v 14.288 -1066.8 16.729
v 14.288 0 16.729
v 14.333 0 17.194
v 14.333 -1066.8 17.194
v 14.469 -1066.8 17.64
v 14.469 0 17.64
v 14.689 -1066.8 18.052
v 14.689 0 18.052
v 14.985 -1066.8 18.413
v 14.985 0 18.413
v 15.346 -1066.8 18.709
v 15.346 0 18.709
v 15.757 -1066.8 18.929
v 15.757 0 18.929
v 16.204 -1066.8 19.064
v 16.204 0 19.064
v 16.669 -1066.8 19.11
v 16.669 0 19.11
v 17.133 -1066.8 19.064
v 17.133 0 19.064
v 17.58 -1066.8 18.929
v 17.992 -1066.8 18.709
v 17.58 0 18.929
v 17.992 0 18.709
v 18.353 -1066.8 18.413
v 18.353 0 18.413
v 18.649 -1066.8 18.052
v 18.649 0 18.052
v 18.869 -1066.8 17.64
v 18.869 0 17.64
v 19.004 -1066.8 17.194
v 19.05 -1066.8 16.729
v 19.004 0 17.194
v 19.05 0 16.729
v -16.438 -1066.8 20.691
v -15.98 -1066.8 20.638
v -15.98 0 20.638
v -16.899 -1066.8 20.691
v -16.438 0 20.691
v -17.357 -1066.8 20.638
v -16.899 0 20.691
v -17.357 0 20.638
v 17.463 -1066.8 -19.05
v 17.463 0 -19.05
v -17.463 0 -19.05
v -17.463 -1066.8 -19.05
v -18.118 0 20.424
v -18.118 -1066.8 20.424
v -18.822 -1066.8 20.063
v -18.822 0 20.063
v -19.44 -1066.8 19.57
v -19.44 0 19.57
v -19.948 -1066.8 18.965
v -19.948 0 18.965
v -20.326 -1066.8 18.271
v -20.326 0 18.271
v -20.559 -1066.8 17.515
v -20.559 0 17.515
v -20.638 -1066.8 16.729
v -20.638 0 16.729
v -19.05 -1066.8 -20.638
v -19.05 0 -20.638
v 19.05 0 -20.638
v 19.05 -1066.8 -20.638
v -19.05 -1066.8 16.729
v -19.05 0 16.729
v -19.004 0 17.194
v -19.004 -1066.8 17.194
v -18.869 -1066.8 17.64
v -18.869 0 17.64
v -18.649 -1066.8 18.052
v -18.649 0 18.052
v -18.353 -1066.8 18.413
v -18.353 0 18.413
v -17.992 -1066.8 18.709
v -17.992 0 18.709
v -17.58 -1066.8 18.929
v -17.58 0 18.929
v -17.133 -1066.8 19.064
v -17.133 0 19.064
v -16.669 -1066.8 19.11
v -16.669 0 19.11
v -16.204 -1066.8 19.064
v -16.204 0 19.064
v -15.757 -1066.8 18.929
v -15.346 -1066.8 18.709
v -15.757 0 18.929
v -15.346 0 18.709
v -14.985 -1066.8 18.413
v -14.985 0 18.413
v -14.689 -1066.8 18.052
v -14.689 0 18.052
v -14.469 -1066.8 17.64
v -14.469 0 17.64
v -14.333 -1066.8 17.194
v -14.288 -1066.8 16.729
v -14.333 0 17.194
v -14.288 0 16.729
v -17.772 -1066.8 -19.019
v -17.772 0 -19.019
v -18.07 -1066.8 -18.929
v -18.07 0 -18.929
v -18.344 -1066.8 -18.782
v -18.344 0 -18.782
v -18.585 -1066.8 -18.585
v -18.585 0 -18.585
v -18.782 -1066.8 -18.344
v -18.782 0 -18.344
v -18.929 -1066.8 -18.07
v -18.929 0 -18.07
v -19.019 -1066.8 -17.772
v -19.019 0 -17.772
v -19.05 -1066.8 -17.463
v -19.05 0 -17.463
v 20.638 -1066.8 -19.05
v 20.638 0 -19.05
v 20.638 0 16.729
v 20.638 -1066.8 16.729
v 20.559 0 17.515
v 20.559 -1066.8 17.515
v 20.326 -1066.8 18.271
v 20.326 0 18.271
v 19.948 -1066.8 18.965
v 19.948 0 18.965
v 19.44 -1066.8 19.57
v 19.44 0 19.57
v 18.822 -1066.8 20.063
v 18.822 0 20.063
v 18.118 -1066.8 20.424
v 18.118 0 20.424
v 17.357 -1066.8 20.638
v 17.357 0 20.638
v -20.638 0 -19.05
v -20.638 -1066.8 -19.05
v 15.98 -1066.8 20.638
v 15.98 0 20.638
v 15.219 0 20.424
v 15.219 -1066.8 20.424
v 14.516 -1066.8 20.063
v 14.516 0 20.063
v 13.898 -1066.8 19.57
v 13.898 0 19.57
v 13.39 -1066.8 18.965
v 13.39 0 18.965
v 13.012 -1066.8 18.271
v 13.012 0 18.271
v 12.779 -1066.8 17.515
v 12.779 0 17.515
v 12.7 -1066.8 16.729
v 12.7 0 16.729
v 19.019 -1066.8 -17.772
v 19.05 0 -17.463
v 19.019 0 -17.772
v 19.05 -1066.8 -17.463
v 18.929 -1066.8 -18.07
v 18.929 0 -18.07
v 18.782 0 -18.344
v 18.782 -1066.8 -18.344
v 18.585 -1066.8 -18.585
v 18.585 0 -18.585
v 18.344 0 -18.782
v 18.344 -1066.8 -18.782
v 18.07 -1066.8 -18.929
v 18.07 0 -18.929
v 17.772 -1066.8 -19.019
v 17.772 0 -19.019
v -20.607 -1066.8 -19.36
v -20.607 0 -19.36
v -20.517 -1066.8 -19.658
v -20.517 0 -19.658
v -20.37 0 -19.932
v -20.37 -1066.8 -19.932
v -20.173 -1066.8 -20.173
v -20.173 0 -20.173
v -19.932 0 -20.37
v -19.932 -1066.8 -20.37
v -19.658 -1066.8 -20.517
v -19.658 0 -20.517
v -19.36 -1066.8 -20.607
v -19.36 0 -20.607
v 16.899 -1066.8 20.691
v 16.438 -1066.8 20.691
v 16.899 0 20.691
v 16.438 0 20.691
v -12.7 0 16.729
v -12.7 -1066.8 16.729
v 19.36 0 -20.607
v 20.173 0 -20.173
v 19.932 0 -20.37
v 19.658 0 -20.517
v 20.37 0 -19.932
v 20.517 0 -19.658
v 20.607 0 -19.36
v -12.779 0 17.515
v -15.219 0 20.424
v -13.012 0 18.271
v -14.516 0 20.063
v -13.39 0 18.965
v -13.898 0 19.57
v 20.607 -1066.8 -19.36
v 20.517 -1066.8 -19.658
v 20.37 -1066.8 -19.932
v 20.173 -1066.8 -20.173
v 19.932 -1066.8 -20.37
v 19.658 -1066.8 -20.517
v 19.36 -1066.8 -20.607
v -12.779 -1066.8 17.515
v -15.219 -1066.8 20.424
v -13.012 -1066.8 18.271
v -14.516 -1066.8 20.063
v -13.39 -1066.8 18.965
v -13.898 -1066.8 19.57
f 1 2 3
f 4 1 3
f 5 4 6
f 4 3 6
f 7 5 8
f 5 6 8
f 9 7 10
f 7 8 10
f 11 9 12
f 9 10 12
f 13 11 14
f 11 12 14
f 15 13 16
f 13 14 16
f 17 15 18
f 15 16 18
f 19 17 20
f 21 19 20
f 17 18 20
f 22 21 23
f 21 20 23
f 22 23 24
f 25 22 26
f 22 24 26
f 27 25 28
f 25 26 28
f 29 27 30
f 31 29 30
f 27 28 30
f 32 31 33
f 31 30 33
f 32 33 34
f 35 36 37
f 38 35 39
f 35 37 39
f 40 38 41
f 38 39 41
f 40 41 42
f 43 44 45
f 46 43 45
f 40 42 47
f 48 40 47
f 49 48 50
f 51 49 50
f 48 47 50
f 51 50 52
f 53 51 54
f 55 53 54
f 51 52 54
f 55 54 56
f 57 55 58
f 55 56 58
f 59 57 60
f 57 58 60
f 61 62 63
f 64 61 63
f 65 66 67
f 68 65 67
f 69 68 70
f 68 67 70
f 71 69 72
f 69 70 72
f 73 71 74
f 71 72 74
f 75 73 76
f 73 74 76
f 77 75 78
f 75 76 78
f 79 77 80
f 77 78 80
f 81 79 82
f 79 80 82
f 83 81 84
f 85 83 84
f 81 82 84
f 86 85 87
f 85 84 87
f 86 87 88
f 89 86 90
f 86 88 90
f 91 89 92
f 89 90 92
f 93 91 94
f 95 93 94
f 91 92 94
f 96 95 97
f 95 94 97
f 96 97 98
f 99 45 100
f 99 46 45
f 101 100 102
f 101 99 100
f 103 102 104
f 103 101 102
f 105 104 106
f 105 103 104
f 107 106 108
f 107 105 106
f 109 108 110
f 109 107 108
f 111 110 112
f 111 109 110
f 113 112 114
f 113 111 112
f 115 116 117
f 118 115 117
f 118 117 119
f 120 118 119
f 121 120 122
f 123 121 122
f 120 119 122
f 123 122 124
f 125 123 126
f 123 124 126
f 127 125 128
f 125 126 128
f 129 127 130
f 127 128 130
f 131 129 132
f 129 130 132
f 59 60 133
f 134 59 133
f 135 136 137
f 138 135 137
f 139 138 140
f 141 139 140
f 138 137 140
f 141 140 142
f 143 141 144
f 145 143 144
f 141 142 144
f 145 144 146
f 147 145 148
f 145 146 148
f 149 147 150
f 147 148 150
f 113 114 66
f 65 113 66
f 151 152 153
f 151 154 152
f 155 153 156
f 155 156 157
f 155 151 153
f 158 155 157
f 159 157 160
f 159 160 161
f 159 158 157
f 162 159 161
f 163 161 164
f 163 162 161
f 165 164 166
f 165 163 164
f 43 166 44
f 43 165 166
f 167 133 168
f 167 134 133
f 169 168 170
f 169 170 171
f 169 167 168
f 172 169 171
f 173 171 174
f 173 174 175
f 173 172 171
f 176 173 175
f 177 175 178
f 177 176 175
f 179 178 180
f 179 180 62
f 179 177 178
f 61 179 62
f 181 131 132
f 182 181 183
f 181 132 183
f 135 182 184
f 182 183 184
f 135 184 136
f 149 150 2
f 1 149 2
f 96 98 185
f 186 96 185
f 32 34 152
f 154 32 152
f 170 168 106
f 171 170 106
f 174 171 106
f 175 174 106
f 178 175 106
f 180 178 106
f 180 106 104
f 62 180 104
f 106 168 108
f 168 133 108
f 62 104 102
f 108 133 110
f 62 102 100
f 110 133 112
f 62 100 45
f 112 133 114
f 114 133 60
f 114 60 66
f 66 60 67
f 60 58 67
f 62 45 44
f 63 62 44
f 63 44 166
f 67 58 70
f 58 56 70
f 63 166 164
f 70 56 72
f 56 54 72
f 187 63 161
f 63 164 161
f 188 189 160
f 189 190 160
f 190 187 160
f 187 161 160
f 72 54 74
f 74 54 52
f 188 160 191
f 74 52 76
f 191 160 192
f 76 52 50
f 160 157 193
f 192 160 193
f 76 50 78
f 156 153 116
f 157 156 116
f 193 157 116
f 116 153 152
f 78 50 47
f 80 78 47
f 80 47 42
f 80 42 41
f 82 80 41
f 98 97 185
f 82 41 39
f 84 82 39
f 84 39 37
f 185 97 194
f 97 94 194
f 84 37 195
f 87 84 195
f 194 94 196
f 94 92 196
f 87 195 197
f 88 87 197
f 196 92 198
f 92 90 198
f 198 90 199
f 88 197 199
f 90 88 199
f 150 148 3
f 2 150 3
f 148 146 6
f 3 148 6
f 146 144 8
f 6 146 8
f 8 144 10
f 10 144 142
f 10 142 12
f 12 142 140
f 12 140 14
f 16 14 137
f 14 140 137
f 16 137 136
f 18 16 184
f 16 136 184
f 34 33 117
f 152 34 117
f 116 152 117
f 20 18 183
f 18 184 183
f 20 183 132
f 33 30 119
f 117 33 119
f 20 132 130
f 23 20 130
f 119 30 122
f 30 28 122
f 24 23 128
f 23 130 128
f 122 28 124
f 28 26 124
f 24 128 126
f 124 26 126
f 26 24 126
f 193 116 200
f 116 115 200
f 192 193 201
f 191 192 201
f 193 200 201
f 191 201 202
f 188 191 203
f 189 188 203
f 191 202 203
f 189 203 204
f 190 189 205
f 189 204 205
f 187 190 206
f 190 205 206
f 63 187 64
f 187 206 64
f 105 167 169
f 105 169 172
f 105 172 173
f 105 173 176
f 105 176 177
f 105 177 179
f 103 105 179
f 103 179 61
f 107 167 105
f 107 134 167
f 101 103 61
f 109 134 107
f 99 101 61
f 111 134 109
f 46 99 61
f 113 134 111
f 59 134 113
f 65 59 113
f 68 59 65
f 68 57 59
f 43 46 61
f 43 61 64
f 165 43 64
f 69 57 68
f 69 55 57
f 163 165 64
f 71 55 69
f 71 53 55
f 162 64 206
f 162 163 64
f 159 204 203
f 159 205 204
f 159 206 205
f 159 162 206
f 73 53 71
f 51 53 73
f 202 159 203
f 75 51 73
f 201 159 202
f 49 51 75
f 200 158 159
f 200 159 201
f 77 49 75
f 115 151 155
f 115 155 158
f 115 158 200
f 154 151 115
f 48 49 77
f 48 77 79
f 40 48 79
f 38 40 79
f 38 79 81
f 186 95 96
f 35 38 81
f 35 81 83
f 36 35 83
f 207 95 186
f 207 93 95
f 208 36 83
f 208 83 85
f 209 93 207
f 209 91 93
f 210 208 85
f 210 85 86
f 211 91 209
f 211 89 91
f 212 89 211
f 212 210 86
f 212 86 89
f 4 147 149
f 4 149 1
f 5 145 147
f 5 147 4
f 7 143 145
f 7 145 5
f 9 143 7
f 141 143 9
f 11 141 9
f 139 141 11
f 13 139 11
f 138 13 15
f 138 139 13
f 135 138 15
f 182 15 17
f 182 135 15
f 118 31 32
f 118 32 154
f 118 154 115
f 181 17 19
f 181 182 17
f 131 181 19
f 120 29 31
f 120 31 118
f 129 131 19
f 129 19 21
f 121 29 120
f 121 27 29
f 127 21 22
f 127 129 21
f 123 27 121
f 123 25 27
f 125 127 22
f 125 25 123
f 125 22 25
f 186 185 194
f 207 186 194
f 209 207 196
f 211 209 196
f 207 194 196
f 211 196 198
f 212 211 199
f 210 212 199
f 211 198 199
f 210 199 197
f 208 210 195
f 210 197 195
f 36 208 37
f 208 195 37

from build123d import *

# Parameters (mm, degrees)
F0_W     = 1.5875
F0_H     = 1.5875
F0_W_2   = 38.1
F1_DEPTH = 1066.8
F2_R     = 1.5875


with BuildPart() as f1:
    # F0 (on Front) → F1 (new body)
    with BuildSketch(Plane.XZ):
        with Locations((19.84375, -19.84375)):
            Rectangle(F0_W, F0_H)
        with Locations((0, -19.84375)):
            Rectangle(F0_W_2, F0_H)
        with BuildLine():
            Line((19.05, -19.05), (20.6375, -19.05))
            Line((20.6375, -19.05), (20.6375, 16.728964))
            ThreePointArc((20.6375, 16.728964), (19.70884, 19.280205), (17.357459, 20.6375))
            Line((17.357459, 20.6375), (15.980041, 20.6375))
            ThreePointArc((15.980041, 20.6375), (13.62866, 19.280205), (12.7, 16.728964))
            Line((12.7, 16.728964), (14.2875, 16.728964))
            ThreePointArc((14.2875, 16.728964), (16.66875, 19.110214), (19.05, 16.728964))
            Line((19.05, 16.728964), (19.05, -19.05))
        make_face()
        with Locations((-19.84375, -19.84375)):
            Rectangle(F0_W, F0_H)
        with BuildLine():
            Line((-20.6375, -19.05), (-19.05, -19.05))
            Line((-19.05, -19.05), (-19.05, 16.728964))
            ThreePointArc((-19.05, 16.728964), (-16.66875, 19.110214), (-14.2875, 16.728964))
            Line((-14.2875, 16.728964), (-12.7, 16.728964))
            ThreePointArc((-12.7, 16.728964), (-13.62866, 19.280205), (-15.980041, 20.6375))
            Line((-15.980041, 20.6375), (-17.357459, 20.6375))
            ThreePointArc((-17.357459, 20.6375), (-19.70884, 19.280205), (-20.6375, 16.728964))
            Line((-20.6375, 16.728964), (-20.6375, -19.05))
        make_face()
        with BuildLine():
            Line((15.980041, 20.6375), (17.357459, 20.6375))
            ThreePointArc((17.357459, 20.6375), (16.66875, 20.697714), (15.980041, 20.6375))
        make_face()
        with BuildLine():
            ThreePointArc((-15.980041, 20.6375), (-16.66875, 20.697714), (-17.357459, 20.6375))
            Line((-17.357459, 20.6375), (-15.980041, 20.6375))
        make_face()
    extrude(amount=F1_DEPTH)

    # F2
    f2_edges = [f1.edges().sort_by_distance(p)[0] for p in [
        (-19.05, -533.4, -19.05),
        (19.05, -533.4, -19.05),
        (20.6375, -533.4, -20.6375),
        (-20.6375, -533.4, -20.6375),
    ]]
    fillet(f2_edges, radius=F2_R)


solid = f1.part
